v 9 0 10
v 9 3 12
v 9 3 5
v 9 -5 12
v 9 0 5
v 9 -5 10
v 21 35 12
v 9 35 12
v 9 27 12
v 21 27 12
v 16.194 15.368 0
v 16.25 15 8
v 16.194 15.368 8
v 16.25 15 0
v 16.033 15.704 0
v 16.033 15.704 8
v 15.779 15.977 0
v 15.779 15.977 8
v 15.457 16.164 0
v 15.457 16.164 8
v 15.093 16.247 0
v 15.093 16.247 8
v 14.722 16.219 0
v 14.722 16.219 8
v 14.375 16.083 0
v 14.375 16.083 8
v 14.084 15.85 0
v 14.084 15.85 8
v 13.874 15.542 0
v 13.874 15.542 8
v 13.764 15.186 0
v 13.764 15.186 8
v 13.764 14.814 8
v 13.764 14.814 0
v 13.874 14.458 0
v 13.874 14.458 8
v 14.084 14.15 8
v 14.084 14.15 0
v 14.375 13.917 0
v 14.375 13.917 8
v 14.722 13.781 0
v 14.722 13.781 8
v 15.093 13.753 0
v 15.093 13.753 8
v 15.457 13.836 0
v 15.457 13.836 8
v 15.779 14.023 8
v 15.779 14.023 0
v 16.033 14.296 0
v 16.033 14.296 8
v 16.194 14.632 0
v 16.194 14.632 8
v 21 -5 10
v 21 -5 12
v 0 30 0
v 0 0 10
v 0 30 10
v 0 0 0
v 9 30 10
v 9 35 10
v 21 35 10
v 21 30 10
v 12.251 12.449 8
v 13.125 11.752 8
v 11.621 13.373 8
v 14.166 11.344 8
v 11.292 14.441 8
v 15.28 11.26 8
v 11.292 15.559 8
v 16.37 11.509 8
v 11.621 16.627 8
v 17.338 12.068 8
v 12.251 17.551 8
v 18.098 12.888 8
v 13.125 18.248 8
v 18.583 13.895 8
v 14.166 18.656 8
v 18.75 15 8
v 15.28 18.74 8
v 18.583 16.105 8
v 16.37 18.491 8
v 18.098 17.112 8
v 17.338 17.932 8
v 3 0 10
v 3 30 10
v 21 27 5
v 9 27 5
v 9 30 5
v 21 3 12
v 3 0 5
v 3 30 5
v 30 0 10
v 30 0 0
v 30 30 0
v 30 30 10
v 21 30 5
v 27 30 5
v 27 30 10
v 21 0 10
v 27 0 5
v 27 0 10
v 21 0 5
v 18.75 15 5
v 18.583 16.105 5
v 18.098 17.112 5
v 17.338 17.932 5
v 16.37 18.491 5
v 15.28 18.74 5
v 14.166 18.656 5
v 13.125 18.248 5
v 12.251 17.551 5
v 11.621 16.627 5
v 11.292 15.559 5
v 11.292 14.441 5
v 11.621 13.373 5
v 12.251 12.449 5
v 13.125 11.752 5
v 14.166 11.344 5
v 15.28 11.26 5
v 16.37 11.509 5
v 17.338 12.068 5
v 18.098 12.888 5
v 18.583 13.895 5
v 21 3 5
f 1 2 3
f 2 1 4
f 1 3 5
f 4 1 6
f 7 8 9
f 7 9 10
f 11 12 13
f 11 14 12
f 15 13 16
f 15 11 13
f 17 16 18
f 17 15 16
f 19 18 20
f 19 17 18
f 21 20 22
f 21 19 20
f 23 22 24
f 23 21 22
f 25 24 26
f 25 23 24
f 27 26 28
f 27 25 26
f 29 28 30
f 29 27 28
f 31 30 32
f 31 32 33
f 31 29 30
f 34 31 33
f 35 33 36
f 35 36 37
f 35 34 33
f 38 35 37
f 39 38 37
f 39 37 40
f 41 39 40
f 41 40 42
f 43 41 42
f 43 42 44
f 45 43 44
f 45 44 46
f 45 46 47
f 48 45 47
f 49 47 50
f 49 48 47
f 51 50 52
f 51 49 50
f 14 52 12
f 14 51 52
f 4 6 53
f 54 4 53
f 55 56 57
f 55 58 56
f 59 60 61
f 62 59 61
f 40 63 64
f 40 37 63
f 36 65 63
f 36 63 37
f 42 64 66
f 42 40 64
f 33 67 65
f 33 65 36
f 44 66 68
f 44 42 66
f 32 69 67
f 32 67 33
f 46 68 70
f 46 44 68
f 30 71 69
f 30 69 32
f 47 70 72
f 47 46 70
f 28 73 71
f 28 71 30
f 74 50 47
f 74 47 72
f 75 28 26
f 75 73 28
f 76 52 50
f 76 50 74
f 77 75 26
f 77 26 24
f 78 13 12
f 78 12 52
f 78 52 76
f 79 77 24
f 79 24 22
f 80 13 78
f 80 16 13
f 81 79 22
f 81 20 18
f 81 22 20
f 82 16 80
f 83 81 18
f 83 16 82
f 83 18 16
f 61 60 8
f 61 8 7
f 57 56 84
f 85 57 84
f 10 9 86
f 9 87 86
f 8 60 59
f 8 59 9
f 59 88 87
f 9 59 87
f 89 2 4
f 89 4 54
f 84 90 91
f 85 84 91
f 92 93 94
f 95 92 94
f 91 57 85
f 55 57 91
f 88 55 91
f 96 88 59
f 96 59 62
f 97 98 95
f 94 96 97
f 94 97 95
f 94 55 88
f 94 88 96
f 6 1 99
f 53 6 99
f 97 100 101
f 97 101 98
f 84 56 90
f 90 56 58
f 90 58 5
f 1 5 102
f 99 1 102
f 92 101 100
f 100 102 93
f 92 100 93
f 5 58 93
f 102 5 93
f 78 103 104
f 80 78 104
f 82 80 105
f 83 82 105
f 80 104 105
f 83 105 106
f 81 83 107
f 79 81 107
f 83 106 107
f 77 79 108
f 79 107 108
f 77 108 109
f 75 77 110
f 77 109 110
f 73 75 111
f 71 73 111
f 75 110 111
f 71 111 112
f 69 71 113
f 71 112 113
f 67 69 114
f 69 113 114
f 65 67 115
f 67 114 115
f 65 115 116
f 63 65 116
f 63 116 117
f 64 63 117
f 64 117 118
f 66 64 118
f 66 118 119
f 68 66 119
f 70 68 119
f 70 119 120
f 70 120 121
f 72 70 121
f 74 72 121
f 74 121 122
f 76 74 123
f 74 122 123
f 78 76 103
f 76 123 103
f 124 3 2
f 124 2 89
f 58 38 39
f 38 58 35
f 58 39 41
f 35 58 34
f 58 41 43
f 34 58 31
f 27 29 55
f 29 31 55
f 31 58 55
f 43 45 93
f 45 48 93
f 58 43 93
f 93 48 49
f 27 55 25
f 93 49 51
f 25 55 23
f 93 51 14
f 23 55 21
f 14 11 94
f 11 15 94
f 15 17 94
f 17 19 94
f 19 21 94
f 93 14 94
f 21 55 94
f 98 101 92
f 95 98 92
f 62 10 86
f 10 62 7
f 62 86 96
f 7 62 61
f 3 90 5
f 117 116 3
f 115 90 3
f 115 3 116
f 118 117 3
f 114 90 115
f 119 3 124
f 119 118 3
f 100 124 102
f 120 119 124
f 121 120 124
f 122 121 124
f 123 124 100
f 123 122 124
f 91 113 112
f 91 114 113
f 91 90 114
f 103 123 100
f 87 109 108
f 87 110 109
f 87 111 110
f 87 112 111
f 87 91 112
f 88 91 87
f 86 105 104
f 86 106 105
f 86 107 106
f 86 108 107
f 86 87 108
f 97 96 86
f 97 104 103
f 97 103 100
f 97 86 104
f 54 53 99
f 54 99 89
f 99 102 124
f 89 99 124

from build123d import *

# Parameters (mm, degrees)
F0_W     = 30
F0_H     = 30
F0_R     = 1.25
F1_DEPTH = 5
F2_W     = 3
F2_H     = 30
F3_DEPTH = 5
F2_R     = 3.75
F2_R_2   = 1.25
F4_DEPTH = 3
F5_W     = 12
F5_H     = 3
F5_H_2   = 5
F6_DEPTH = 2
F7_W     = 12
F7_H     = 5
F7_H_2   = 3
F8_DEPTH = 2


# Not quite as in the source:
# - a feature names something its author has since deleted; it is built from what else it names


with BuildPart() as f1:
    # F0 (on Top) → F1 (new body)
    with BuildSketch(Plane.XY):
        with Locations((15, 15)):
            Rectangle(F0_W, F0_H)
        with Locations((15, 15)):
            Circle(F0_R, mode=Mode.SUBTRACT)
    extrude(amount=F1_DEPTH)

    # F2 (on face) → F3 (join)
    with BuildSketch(Plane.XY.offset(5)):
        with Locations((1.5, 15)):
            Rectangle(F2_W, F2_H)
        with Locations((28.5, 15)):
            Rectangle(F2_W, F2_H)
        Polygon((9, 3), (9, 0), (15, 0), (21, 0), (21, 3), (15, 3), align=None)
        Polygon((15, 30), (9, 30), (9, 27), (15, 27), (21, 27), (21, 30), align=None)
    extrude(amount=F3_DEPTH)

    # F2 (on face) → F4 (join)
    with BuildSketch(Plane.XY.offset(5)):
        with Locations((15, 15)):
            Circle(F2_R)
        with Locations((15, 15)):
            Circle(F2_R_2, mode=Mode.SUBTRACT)
    extrude(amount=F4_DEPTH)

    # F5 (on face) → F6 (join)
    with BuildSketch(Plane.XY.offset(10)):
        with Locations((15, 1.5)):
            Rectangle(F5_W, F5_H)
        with Locations((15, -2.5)):
            Rectangle(F5_W, F5_H_2)
    extrude(amount=F6_DEPTH)

    # F7 (on face) → F8 (join)
    with BuildSketch(Plane.XY.offset(10)):
        with Locations((15, 32.5)):
            Rectangle(F7_W, F7_H)
        with Locations((15, 28.5)):
            Rectangle(F7_W, F7_H_2)
    extrude(amount=F8_DEPTH)


solid = f1.part
